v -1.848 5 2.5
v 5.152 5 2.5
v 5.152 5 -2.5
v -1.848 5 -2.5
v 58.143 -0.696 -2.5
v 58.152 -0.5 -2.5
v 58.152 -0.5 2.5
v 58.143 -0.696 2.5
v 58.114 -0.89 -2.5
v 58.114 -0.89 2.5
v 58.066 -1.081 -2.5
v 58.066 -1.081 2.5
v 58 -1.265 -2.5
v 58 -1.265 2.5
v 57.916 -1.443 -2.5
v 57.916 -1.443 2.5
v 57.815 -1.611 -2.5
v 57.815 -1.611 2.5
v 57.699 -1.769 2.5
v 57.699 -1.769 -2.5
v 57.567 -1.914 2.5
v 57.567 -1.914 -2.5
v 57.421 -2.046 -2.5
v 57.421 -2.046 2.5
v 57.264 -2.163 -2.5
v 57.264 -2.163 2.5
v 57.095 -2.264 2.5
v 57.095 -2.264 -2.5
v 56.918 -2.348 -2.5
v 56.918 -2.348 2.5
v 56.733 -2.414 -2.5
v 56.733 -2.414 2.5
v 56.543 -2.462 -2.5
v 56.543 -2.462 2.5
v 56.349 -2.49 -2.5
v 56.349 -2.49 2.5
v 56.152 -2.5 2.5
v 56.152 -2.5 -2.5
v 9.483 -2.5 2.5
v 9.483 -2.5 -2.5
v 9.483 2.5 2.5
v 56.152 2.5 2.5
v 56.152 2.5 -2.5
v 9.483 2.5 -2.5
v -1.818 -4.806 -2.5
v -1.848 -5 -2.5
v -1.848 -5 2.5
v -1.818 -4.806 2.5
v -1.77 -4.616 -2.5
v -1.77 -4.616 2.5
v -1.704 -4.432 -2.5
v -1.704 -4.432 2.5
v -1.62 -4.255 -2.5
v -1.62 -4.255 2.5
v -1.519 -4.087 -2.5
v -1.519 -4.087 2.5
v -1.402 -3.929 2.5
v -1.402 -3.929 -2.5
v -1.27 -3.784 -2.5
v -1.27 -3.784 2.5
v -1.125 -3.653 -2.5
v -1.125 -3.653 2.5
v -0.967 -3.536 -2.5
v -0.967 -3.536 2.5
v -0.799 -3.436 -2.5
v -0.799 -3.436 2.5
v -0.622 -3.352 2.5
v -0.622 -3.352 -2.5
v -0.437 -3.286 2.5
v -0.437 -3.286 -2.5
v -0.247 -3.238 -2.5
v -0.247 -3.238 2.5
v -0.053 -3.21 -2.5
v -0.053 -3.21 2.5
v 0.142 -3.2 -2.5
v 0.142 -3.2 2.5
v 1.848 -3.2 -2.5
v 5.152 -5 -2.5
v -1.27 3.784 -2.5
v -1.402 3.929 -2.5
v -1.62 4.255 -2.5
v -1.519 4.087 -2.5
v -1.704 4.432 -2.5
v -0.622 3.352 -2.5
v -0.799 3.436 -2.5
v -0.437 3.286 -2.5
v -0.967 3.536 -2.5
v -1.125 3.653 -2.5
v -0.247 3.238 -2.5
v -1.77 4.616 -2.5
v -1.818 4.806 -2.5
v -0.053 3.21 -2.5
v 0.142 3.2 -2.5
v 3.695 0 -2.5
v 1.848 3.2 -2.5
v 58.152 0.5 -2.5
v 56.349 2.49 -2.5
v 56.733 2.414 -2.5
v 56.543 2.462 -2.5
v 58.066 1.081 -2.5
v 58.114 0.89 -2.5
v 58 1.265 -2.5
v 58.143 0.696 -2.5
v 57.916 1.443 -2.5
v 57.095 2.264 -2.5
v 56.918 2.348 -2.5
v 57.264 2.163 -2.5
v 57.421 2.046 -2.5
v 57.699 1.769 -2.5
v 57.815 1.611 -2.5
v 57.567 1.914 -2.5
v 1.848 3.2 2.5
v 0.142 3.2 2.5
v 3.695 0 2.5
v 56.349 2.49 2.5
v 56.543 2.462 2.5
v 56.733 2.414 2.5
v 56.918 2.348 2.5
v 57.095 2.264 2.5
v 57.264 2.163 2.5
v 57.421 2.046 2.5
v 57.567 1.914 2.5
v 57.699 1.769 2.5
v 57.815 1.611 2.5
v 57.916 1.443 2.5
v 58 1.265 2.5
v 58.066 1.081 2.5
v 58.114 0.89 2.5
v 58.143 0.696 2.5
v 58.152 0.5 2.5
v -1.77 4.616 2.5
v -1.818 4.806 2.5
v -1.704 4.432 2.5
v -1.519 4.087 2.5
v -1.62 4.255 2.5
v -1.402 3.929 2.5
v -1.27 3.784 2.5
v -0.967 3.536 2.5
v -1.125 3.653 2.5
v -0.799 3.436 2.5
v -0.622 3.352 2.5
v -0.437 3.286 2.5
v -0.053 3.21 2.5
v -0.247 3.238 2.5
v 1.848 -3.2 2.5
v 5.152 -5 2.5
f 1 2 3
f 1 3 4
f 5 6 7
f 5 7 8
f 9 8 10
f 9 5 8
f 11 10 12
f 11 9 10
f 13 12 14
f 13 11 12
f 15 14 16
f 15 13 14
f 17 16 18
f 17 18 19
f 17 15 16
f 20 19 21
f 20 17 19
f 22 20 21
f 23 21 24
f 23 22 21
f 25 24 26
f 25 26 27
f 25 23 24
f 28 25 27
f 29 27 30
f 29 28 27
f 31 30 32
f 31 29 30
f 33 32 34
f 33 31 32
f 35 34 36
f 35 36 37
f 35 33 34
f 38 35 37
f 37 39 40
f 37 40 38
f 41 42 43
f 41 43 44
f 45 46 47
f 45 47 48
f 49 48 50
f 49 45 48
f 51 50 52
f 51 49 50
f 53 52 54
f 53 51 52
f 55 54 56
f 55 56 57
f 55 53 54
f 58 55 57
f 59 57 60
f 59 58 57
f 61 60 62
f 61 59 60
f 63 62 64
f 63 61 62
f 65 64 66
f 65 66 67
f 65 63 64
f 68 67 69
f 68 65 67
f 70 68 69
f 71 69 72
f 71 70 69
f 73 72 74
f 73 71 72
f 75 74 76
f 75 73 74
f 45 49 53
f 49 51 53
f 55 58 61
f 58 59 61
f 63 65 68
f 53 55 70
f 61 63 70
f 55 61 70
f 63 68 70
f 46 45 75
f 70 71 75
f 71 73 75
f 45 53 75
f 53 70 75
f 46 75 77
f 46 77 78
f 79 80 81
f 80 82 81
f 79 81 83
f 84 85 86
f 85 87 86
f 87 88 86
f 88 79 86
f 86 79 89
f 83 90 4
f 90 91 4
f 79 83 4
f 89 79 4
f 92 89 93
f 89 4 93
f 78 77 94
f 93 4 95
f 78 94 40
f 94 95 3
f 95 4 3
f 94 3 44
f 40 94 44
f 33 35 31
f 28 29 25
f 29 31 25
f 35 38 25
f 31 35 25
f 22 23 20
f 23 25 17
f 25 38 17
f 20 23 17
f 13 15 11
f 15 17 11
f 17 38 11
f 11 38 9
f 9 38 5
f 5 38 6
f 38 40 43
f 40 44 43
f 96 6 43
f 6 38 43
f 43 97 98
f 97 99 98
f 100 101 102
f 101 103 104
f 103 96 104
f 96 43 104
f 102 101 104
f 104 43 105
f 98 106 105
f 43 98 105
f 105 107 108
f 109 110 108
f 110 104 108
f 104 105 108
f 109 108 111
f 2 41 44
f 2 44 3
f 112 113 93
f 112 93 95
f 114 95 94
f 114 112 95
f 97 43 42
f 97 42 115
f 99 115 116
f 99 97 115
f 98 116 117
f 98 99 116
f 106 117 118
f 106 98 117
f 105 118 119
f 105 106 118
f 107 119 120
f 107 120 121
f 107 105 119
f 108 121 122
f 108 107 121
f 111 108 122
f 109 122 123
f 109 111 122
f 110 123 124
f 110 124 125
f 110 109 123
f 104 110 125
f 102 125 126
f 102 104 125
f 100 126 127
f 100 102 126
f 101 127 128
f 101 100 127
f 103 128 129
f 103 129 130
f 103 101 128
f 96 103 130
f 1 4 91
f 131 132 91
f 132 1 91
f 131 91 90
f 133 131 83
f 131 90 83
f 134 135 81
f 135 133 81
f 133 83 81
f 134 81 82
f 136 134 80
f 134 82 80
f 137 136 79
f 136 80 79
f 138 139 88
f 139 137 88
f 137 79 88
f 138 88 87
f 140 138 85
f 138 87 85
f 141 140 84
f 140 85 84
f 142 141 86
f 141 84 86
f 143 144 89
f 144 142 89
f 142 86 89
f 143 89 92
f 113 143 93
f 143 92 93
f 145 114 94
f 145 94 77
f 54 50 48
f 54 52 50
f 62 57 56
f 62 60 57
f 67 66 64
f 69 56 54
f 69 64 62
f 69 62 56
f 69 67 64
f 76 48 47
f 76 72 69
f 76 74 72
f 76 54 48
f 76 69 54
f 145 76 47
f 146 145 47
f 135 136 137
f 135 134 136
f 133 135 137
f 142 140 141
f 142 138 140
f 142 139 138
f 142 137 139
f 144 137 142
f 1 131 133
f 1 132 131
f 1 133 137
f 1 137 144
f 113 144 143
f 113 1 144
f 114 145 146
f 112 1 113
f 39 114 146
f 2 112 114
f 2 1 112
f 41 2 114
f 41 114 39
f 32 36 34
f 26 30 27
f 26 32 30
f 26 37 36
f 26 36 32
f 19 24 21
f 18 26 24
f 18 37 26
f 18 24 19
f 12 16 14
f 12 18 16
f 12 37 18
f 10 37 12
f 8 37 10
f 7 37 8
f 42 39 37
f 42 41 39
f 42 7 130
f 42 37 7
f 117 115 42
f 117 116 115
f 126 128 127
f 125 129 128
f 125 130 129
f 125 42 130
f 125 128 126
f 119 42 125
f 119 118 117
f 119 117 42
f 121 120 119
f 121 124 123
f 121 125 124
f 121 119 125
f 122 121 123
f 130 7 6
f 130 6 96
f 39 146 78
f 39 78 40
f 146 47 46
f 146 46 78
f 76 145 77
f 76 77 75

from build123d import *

# Parameters (mm, degrees)
F1_DEPTH    = 2.5
F2_T1_DEPTH = 14.9498743711
F2_T3_DEPTH = 15


# Not quite as in the source:
# - a fillet or chamfer that OpenCascade refuses, or shapes differently, is made with other operations: its cross-section is extruded or revolved along the edge and cut away or added


with BuildPart() as f1:
    # F0 (on Top) → F1 (new body, symmetric)
    with BuildSketch(Plane.XY):
        Polygon((1.8475208614, 3.2), (3.6950417228, 0), (1.8475208614, -3.2), (-1.8475208614, -3.2), (-1.8475208614, -5), (5.1524791386, -5), (9.4826061575, -2.5), (58.1524791386, -2.5), (58.1524791386, 2.5), (9.4826061575, 2.5), (5.1524791386, 5), (-1.8475208614, 5), (-1.8475208614, 3.2), align=None)
    extrude(amount=F1_DEPTH, both=True)

    # F2: fillet of radius 2 on 4 edges, made by hand

    # F2_s2 → F2_t1 (cut)
    with BuildSketch(Plane.XY.offset(-7.4749371855)):
        with BuildLine():
            ThreePointArc((-1.8475208614, 5), (-1.1991867737, 3.7167603026), (0.1424540128, 3.2))
            Line((0.1424540128, 3.2), (-1.8475208614, 3.2))
            Line((-1.8475208614, 3.2), (-1.8475208614, 5))
        make_face()
        with BuildLine():
            ThreePointArc((-1.8475208614, -5), (-1.1991867737, -3.7167603026), (0.1424540128, -3.2))
            Line((0.1424540128, -3.2), (-1.8475208614, -3.2))
            Line((-1.8475208614, -3.2), (-1.8475208614, -5))
        make_face()
    extrude(amount=F2_T1_DEPTH, mode=Mode.SUBTRACT)

    # F2_s4 → F2_t3 (cut)
    with BuildSketch(Plane.XY.offset(-7.5)):
        with BuildLine():
            ThreePointArc((58.1524791386, -0.5), (57.566692701, -1.9142135624), (56.1524791386, -2.5))
            Line((56.1524791386, -2.5), (58.1524791386, -2.5))
            Line((58.1524791386, -2.5), (58.1524791386, -0.5))
        make_face()
        with BuildLine():
            ThreePointArc((56.1524791386, 2.5), (57.566692701, 1.9142135624), (58.1524791386, 0.5))
            Line((58.1524791386, 0.5), (58.1524791386, 2.5))
            Line((58.1524791386, 2.5), (56.1524791386, 2.5))
        make_face()
    extrude(amount=F2_T3_DEPTH, mode=Mode.SUBTRACT)


solid = f1.part
